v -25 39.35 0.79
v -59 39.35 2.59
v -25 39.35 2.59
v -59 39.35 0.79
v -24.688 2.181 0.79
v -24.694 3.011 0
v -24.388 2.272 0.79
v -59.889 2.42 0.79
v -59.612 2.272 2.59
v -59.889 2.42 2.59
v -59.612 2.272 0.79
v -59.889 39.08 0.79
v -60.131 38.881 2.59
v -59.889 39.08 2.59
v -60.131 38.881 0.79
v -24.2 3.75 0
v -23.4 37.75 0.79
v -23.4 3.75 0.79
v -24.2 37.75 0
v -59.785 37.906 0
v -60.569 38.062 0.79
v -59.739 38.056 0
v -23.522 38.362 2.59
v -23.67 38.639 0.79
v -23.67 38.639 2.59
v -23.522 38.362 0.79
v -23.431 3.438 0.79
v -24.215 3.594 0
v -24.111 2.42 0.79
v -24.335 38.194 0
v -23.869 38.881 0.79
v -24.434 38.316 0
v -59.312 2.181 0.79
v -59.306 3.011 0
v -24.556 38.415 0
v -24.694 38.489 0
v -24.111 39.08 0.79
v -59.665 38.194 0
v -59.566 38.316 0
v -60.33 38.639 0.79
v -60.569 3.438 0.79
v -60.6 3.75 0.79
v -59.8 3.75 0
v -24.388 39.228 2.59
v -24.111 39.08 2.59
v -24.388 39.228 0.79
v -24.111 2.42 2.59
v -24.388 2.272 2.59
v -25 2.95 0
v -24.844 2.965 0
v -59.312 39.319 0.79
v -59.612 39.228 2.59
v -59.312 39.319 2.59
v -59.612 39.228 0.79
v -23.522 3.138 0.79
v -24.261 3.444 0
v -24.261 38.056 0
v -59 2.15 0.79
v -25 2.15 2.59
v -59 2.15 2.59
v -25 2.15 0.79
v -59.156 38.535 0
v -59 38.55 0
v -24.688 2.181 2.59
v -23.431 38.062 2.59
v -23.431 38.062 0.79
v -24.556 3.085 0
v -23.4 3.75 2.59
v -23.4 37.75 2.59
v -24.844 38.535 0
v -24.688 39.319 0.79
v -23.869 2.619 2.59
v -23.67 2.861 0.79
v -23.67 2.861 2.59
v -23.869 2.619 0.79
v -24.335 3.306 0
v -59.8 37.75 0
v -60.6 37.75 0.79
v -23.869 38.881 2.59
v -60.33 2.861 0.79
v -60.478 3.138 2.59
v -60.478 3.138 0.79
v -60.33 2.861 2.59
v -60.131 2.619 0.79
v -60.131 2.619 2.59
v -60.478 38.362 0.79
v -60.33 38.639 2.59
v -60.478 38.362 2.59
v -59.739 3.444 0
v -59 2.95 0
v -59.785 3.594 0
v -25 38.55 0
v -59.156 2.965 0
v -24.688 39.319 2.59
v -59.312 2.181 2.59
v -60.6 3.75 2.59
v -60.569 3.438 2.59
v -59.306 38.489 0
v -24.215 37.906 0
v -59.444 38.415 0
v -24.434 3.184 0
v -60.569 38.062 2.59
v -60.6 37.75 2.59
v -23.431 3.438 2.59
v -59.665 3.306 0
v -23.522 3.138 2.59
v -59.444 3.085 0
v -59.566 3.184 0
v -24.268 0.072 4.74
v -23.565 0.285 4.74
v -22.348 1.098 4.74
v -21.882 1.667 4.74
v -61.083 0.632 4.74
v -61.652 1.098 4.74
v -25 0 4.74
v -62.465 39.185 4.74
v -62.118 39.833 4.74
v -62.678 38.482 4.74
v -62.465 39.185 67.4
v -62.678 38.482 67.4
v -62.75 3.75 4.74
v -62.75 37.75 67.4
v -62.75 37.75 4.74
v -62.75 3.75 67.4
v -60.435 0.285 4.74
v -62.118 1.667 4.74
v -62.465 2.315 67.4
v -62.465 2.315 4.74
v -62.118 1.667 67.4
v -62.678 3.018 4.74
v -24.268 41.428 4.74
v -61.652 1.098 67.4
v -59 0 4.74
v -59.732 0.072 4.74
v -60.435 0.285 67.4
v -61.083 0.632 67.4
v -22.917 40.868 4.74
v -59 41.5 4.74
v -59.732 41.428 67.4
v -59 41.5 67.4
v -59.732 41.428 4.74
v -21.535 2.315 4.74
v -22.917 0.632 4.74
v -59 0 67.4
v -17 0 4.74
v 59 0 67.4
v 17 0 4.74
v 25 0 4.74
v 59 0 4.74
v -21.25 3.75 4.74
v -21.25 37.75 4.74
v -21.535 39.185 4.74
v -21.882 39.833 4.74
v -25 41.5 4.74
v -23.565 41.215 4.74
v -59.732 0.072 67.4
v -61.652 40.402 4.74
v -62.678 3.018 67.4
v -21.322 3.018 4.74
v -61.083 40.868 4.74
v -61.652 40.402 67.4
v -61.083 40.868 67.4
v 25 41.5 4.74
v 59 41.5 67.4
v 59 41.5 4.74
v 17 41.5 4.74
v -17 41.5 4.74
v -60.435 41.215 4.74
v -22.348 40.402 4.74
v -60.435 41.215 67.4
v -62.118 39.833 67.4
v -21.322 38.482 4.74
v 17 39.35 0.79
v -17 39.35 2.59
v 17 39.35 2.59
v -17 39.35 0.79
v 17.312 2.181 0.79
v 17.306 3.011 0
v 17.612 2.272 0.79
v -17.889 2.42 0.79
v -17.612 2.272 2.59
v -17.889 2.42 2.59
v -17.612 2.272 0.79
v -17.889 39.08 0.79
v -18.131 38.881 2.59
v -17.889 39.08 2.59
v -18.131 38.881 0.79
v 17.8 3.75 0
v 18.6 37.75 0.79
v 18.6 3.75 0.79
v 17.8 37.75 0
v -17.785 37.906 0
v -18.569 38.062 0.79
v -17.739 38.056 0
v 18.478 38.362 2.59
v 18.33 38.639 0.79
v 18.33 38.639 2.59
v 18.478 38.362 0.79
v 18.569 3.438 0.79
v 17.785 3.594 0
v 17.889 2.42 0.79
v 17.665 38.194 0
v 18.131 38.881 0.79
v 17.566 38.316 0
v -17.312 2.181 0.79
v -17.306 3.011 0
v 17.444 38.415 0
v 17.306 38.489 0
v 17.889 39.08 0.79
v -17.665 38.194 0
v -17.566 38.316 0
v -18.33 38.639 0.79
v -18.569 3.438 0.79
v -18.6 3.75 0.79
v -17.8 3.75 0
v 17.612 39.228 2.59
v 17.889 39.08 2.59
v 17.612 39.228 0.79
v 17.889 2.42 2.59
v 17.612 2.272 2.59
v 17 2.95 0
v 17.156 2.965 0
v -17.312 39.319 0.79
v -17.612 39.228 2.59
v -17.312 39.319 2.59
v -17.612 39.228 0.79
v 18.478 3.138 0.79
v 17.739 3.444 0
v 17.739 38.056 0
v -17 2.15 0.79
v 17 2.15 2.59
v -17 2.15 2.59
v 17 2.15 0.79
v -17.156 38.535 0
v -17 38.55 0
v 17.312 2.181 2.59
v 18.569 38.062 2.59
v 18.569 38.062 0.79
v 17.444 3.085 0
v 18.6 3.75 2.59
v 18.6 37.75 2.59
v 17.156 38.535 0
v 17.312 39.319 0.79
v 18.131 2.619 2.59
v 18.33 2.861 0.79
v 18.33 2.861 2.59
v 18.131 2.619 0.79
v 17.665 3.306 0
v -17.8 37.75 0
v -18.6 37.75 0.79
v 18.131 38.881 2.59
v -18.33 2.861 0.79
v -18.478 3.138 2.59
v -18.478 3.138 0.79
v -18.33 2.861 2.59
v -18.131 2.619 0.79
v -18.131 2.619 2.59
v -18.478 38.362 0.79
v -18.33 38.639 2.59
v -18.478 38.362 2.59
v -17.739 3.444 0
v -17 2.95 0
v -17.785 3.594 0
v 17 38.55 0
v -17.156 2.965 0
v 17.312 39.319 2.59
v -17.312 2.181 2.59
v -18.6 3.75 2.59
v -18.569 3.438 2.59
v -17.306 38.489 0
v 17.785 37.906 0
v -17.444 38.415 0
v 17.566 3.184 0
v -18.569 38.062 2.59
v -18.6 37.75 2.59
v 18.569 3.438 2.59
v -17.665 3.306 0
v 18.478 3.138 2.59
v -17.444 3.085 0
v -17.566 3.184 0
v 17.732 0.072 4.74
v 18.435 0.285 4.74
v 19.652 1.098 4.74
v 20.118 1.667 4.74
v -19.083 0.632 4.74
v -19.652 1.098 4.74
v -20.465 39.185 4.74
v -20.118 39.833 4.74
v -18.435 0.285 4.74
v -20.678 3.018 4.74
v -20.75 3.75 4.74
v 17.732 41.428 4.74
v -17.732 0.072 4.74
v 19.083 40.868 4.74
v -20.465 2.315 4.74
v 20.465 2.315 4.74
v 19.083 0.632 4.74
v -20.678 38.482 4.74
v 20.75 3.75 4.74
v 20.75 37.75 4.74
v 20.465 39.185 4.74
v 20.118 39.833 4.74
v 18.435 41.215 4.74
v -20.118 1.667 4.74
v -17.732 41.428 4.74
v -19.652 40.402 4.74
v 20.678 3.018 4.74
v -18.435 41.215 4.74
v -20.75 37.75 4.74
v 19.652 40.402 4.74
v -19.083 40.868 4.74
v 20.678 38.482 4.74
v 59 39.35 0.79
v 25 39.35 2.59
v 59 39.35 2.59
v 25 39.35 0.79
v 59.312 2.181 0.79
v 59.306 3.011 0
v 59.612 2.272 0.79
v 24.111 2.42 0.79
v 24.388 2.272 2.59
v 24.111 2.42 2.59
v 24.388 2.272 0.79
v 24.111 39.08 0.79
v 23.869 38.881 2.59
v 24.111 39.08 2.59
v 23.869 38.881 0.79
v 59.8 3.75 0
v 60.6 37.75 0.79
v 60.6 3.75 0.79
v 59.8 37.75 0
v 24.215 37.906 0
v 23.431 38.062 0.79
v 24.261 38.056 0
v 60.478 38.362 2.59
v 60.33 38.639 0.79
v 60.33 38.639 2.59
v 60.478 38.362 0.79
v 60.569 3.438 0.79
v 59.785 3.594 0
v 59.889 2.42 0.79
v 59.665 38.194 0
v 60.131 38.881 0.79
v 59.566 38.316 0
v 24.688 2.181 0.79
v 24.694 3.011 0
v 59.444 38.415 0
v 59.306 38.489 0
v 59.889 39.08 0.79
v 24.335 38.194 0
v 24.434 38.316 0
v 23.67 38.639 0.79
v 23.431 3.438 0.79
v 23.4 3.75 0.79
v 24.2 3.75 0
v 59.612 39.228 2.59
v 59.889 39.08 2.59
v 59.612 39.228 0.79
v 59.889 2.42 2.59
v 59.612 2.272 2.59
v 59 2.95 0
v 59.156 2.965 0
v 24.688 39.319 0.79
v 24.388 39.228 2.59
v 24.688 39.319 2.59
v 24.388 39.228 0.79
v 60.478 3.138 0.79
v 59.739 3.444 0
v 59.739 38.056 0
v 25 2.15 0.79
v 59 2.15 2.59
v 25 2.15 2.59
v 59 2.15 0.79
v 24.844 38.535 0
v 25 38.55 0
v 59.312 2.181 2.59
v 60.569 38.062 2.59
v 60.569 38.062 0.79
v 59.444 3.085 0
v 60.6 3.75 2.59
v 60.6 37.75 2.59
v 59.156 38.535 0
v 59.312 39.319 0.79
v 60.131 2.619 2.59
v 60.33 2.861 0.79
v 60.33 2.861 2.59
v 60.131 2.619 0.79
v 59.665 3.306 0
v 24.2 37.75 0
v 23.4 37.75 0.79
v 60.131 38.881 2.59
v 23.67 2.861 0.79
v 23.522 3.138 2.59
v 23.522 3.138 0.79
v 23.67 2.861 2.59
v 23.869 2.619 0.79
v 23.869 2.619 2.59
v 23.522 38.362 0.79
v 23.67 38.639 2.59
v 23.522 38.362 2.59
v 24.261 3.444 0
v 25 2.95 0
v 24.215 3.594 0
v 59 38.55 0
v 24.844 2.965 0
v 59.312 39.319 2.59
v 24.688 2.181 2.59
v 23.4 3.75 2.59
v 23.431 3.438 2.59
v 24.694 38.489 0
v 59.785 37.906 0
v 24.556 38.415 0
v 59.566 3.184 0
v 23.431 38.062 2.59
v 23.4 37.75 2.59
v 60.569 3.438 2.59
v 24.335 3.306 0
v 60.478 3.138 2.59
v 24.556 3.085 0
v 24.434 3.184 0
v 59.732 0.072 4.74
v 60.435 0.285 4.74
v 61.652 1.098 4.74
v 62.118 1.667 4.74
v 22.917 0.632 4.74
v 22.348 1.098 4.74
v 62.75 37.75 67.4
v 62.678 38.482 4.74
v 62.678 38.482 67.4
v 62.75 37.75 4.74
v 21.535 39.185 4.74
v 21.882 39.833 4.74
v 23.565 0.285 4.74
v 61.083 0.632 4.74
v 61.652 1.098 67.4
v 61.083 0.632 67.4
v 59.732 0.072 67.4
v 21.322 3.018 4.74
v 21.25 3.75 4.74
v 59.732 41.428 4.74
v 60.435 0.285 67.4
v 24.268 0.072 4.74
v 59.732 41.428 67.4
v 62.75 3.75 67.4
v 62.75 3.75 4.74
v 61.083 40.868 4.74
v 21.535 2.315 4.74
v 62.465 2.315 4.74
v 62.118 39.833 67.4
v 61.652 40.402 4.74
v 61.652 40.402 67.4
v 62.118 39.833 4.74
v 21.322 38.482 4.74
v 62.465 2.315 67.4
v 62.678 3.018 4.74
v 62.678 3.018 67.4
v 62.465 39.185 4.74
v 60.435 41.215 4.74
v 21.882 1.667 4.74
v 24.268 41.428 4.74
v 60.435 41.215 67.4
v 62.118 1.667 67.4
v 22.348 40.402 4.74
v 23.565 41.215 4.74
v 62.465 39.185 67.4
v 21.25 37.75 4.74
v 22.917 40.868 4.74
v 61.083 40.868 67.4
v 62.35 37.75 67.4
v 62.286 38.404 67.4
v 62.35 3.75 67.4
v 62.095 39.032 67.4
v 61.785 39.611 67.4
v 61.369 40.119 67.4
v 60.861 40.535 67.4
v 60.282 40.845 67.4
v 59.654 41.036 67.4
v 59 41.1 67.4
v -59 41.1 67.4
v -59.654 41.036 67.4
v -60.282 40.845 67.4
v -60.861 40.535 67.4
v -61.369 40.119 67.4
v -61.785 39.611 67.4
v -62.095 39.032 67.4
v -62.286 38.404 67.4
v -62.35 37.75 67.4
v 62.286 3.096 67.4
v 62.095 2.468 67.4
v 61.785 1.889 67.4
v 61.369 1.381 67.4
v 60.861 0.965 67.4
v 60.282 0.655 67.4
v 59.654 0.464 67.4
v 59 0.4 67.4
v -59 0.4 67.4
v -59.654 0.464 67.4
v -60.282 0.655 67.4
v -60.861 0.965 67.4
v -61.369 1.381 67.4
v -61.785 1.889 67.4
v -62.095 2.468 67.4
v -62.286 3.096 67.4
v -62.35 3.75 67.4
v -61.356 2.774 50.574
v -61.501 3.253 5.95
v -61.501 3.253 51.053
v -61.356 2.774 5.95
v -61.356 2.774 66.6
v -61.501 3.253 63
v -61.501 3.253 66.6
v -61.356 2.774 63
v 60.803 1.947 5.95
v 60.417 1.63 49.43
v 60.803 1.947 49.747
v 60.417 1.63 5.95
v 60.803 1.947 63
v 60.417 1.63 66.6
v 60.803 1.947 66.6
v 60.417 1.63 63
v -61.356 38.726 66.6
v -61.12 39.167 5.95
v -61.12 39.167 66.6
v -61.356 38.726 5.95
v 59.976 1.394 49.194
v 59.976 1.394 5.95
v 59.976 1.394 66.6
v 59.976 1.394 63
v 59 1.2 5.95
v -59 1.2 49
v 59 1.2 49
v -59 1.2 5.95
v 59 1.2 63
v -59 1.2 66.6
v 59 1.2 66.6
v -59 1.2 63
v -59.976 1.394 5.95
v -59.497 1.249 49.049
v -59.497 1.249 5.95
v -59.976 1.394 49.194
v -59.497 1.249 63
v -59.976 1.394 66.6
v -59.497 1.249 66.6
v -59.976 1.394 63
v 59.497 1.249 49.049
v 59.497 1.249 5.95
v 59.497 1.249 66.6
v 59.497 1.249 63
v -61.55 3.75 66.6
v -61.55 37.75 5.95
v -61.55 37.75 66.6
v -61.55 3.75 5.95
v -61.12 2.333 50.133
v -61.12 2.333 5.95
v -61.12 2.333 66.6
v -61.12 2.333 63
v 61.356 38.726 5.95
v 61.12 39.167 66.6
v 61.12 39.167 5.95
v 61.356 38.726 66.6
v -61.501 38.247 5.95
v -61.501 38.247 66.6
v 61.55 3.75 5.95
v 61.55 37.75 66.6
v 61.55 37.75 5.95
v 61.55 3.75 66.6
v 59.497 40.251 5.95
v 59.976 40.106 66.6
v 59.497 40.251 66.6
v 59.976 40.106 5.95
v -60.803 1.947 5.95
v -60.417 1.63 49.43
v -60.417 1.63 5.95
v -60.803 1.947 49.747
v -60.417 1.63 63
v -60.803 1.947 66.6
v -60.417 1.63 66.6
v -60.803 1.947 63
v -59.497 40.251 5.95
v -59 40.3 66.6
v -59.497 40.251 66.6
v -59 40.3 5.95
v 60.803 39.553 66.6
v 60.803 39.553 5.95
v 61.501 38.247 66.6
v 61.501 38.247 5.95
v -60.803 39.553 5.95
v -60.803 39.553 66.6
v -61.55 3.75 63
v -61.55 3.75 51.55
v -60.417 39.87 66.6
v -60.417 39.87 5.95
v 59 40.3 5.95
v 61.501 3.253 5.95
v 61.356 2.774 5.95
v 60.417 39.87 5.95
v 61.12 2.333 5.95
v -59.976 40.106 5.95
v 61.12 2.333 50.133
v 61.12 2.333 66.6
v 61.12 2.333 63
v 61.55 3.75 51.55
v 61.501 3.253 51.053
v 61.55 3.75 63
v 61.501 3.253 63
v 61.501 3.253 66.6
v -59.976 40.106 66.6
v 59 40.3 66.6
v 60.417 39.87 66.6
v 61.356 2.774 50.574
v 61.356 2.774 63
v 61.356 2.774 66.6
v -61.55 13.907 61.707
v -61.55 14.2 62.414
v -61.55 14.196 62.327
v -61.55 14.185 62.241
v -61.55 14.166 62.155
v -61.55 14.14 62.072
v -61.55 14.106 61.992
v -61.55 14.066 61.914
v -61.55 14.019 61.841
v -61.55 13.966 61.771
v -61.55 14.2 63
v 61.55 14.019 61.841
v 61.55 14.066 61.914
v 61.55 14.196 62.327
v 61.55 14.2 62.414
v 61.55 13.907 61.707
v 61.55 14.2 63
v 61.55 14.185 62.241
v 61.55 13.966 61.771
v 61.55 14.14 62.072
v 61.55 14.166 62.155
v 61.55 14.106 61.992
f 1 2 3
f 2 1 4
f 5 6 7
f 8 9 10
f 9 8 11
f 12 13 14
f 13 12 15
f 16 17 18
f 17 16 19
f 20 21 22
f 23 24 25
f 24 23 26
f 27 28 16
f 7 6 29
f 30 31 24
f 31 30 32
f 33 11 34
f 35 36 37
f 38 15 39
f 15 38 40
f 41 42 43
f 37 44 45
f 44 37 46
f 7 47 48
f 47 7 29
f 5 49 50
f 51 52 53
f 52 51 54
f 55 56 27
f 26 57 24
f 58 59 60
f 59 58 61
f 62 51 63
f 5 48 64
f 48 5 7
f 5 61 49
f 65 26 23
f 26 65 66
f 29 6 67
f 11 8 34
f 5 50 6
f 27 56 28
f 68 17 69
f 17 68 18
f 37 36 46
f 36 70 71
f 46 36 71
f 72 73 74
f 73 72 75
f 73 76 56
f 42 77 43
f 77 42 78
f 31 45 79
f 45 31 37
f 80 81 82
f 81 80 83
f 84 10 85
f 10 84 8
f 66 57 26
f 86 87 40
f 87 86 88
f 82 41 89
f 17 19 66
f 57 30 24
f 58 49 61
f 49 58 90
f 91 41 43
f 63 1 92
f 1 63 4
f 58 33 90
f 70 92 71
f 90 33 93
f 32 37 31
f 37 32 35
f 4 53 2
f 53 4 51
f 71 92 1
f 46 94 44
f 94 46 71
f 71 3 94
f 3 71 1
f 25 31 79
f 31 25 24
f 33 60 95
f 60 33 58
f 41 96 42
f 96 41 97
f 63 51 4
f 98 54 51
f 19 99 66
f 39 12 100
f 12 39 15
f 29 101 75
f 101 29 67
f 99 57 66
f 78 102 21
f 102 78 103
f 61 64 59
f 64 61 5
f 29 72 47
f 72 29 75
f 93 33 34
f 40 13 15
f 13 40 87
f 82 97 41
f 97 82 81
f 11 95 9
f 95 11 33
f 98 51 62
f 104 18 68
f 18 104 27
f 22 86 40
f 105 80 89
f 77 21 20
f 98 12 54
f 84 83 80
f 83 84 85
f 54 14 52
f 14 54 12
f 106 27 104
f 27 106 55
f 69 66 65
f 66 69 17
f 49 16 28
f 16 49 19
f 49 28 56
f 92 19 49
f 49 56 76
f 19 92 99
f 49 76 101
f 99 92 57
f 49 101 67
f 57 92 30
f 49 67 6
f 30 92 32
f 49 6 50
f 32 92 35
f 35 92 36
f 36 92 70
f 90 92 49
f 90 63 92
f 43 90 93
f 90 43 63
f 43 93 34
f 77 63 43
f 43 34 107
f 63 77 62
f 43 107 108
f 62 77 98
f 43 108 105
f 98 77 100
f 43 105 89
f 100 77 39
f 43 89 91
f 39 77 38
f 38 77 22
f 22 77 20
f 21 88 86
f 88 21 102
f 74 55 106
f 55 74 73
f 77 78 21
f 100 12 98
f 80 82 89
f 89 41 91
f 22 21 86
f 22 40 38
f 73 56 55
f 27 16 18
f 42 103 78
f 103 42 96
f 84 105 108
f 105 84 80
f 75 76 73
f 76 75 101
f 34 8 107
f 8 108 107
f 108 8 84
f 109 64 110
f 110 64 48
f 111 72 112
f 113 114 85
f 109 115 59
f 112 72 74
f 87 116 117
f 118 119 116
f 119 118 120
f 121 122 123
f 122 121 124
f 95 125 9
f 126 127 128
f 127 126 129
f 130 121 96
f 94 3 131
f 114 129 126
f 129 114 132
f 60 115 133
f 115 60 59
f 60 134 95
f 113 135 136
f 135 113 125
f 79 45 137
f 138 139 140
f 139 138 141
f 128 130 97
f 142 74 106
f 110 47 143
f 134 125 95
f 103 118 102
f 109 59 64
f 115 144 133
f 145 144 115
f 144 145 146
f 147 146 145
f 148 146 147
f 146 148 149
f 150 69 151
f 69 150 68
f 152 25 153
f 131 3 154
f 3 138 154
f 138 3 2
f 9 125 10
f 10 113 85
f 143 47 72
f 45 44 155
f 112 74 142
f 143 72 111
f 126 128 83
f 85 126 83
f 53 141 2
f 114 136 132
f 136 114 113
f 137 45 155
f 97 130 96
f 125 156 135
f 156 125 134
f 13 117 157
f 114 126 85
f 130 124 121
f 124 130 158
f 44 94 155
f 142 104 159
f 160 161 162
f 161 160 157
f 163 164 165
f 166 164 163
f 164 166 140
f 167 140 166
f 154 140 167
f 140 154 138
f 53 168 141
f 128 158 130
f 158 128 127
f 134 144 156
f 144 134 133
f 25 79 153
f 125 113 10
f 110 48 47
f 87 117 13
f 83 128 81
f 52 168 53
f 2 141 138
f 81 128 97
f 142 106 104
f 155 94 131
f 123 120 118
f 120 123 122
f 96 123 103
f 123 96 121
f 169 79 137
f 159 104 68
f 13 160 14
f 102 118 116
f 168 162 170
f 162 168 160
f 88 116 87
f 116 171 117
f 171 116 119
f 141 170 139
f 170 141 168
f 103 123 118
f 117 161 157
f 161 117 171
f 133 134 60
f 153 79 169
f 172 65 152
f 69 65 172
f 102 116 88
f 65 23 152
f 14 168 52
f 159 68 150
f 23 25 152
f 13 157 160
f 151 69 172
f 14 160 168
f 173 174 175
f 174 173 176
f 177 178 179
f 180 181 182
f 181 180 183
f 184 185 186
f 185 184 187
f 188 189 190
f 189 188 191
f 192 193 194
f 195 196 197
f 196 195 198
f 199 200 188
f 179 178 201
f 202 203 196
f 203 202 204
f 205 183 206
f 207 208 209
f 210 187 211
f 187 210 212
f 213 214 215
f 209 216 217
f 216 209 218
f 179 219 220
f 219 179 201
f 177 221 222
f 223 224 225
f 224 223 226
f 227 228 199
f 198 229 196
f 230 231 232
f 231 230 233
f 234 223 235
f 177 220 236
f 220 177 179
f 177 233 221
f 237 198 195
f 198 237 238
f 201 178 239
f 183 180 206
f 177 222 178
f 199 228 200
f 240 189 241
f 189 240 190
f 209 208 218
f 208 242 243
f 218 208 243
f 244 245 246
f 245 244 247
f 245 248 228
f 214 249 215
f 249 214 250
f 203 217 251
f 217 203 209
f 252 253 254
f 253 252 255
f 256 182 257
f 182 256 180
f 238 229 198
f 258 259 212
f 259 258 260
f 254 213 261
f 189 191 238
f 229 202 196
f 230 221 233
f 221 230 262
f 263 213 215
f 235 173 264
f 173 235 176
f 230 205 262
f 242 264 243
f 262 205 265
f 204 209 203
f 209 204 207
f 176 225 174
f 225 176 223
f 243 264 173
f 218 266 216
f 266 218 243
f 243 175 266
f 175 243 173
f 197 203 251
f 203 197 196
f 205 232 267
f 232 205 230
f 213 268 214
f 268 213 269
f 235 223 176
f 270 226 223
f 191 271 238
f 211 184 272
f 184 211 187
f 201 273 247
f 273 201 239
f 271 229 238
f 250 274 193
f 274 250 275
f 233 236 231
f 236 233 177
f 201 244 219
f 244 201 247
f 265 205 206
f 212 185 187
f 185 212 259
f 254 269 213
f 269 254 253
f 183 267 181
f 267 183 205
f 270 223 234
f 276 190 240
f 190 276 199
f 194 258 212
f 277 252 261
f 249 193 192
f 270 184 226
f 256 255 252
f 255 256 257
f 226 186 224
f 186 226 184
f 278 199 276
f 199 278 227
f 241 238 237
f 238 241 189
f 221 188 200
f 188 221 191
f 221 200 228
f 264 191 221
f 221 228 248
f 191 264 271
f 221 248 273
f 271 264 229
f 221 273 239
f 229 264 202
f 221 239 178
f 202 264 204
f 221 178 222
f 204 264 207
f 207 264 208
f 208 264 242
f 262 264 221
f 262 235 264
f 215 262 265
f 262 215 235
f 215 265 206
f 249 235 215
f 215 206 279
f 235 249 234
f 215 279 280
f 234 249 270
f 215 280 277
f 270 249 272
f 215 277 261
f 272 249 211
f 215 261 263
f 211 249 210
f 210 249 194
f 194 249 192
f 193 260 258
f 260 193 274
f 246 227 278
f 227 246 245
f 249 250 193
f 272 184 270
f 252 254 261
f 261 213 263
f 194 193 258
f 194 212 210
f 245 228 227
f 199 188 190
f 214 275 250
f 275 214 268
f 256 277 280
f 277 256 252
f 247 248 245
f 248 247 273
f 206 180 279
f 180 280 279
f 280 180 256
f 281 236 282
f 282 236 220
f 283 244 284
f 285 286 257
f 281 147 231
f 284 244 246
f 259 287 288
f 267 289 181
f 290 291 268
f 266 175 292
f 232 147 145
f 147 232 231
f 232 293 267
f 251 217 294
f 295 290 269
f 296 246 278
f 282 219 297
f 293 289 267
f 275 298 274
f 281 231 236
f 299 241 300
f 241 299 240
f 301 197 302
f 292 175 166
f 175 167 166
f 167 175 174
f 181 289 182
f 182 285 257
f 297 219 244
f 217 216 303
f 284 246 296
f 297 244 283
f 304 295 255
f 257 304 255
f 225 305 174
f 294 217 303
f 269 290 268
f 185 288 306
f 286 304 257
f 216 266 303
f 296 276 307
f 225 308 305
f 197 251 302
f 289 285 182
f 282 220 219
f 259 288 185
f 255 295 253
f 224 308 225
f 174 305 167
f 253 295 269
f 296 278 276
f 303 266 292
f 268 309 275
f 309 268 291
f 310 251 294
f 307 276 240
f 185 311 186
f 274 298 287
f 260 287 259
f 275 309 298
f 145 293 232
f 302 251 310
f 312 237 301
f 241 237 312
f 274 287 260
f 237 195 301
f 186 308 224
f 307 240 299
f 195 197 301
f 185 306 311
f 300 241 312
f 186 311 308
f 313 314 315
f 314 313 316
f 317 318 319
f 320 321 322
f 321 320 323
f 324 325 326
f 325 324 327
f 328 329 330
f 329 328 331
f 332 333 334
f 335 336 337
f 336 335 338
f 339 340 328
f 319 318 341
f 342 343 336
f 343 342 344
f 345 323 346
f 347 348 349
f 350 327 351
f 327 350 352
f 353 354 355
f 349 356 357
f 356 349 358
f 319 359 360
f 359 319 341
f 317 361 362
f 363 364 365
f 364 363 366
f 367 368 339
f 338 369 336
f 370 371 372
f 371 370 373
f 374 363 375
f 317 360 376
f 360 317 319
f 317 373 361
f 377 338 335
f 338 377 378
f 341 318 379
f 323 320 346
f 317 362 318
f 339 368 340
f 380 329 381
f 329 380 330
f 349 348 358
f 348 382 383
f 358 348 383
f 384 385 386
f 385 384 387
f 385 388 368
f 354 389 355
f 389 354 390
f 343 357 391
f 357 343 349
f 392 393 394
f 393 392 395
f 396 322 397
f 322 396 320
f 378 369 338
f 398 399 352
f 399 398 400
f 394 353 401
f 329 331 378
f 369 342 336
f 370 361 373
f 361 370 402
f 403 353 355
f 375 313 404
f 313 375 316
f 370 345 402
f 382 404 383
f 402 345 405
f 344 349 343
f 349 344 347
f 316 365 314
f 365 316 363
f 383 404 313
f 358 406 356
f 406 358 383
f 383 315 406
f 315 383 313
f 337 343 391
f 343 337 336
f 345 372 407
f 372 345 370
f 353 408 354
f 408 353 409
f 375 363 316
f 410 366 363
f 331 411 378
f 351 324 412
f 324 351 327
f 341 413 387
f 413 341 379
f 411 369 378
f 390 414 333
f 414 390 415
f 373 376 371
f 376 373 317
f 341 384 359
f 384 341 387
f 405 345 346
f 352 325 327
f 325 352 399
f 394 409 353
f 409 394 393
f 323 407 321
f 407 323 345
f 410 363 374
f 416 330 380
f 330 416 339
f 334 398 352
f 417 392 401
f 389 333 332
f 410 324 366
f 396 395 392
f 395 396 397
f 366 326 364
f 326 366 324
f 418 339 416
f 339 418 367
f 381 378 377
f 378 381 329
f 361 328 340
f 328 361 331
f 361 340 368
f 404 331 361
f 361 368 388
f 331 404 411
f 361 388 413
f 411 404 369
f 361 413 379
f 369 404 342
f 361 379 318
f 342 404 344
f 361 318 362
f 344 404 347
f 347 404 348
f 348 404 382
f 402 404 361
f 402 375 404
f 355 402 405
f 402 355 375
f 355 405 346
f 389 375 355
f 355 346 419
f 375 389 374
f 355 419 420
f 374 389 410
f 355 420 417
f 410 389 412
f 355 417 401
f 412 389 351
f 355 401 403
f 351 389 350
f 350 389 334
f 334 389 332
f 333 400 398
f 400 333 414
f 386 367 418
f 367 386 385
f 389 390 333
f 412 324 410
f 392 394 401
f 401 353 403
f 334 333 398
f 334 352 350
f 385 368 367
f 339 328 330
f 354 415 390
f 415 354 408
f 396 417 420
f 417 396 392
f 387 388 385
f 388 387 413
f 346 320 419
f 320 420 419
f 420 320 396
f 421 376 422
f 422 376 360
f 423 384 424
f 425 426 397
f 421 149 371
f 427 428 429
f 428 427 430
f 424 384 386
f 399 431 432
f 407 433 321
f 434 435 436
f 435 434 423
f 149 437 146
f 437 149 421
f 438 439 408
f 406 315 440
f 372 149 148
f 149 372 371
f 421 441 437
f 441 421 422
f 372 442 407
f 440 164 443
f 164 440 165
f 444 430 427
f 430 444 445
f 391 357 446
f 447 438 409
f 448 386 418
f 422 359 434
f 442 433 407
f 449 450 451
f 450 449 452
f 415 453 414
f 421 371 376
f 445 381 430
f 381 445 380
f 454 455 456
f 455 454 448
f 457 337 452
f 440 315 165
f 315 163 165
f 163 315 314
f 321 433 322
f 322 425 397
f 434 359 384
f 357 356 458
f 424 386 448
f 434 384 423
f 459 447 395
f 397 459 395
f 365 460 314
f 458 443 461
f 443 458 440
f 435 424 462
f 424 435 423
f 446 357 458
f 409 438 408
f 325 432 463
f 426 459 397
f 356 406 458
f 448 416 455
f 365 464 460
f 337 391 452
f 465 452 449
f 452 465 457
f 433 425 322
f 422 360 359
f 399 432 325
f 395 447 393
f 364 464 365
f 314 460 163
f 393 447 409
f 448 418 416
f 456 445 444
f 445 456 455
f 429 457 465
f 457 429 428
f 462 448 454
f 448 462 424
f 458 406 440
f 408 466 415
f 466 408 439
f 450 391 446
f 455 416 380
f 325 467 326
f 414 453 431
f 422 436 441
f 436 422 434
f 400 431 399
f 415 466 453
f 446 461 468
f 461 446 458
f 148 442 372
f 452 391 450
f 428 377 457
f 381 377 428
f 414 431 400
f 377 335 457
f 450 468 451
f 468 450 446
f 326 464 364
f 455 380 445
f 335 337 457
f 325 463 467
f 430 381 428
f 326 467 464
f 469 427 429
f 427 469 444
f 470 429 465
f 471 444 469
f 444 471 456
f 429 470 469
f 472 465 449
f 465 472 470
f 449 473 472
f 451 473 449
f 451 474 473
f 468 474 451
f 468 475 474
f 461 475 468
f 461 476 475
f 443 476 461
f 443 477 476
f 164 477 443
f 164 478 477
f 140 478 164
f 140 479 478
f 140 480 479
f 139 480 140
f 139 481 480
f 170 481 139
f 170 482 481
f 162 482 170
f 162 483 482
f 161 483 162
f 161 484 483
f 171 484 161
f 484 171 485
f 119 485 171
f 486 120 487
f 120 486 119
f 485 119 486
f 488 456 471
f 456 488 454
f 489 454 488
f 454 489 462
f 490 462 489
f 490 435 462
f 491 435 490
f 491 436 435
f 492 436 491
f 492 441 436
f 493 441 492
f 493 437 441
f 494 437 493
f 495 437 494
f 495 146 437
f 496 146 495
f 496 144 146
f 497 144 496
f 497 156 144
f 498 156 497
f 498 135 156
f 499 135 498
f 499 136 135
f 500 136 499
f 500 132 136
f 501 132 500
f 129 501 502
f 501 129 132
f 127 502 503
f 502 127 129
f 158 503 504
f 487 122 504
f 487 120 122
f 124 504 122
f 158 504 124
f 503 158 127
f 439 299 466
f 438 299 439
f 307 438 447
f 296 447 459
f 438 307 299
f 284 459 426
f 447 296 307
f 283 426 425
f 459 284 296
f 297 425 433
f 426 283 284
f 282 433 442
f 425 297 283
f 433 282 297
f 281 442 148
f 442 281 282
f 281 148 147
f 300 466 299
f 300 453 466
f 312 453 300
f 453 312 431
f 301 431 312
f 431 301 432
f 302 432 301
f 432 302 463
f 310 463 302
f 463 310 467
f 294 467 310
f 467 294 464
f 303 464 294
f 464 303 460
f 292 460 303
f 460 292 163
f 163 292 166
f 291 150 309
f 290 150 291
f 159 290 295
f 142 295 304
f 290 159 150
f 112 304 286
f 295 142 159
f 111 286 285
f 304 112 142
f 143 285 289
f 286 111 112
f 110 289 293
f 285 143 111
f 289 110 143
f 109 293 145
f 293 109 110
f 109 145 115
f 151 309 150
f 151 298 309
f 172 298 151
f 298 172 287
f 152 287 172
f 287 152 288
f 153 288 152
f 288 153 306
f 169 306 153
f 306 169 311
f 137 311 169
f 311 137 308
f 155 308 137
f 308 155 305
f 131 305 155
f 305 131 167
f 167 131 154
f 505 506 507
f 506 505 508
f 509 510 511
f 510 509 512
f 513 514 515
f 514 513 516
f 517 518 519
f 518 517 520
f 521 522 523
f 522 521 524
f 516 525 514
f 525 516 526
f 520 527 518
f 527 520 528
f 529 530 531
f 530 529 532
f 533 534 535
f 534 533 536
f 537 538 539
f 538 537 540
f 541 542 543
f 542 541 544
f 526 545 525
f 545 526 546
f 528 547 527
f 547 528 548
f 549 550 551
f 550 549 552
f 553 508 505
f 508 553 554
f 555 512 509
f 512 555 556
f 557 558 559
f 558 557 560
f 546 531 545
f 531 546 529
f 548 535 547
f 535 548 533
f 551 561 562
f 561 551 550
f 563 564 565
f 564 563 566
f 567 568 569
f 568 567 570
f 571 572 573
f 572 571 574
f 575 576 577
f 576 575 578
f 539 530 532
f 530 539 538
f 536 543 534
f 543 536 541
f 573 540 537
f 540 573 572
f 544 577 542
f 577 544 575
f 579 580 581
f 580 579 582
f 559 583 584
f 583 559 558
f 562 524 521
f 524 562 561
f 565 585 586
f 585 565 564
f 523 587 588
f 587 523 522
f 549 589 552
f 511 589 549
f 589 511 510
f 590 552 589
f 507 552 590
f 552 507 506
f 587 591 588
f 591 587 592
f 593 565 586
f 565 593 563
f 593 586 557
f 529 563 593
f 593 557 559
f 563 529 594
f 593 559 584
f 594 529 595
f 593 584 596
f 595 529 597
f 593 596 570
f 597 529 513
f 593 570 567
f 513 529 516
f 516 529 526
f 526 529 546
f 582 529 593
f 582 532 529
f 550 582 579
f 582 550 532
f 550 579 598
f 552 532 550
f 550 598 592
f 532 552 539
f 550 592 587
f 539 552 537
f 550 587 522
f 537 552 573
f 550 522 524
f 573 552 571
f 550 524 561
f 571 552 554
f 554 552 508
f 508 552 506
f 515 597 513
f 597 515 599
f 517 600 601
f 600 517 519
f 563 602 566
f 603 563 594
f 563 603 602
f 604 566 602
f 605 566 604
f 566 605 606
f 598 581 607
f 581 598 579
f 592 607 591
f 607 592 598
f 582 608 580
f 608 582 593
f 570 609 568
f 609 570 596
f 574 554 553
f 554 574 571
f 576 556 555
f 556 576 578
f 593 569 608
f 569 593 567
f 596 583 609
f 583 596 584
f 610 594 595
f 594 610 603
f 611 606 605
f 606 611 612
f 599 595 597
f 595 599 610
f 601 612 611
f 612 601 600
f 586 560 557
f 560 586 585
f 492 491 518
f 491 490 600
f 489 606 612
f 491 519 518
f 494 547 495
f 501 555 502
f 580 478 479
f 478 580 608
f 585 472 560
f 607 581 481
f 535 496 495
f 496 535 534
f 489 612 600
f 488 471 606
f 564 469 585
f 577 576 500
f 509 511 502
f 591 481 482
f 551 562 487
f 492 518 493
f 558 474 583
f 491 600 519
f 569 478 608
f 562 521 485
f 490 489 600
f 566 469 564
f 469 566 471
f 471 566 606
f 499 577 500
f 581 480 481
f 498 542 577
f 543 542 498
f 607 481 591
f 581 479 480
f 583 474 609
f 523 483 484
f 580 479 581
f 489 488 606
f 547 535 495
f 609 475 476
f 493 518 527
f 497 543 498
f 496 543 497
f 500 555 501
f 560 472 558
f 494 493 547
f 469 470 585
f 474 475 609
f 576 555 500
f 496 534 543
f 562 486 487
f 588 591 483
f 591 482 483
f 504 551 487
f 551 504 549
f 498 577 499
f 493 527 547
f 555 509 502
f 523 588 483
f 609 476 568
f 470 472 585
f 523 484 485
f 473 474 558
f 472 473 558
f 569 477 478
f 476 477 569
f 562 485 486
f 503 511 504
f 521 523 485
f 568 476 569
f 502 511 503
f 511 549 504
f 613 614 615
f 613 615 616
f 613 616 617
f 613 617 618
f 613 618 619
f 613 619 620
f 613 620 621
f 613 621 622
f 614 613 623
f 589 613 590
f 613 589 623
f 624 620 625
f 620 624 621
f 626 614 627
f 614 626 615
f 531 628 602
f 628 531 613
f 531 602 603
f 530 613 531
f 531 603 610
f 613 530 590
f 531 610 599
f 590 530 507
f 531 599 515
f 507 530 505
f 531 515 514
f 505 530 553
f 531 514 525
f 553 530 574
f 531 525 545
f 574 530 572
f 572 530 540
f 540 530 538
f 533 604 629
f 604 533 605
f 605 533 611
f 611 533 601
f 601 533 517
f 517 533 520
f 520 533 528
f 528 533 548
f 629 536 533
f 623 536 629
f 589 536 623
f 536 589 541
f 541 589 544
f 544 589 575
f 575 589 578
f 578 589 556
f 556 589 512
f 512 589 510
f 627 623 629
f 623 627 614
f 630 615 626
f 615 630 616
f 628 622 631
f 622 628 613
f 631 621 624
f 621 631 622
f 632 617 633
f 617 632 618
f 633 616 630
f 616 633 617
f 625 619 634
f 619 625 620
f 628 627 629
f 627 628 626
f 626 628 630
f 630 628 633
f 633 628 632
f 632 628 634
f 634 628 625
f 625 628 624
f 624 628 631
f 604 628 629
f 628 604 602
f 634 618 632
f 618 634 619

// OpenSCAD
// file: ../../../modules/gridfinity.scad
// Gridfinity ベースプレートの共有 module。
// 寸法は Gridfinity 仕様 (Zack Freedman) の baseplate 輪郭に従う:
//   ピッチ 42、ソケット上端開口 41.5 (角 R4)、上から 45° 面取り 2.15 →
//   垂直 1.8 (37.2 角・R1.85) → 45° 面取り 0.7 → 底 35.8 角 (R1.15)。
//   ソケット深さ = 2.15 + 1.8 + 0.7 = 4.65。
//
// 座標系: X が列方向 (中央が 0)、Y が行方向 (板の前端が 0)、Z=0 が板の底面。
// 板の外形は grid とは独立に rim で与えるので、grid より大きい板 (縁付き) を
// 作れる。ソケットは rim=[left, right, front, back] の内側へ 42 ピッチで並ぶ。

gf_pitch = 42;
gf_socket_top = 41.5; // 上端開口
gf_socket_mid = 37.2; // 垂直部
gf_socket_bot = 35.8; // 底
gf_socket_r_top = 4;
gf_socket_r_mid = 1.85;
gf_socket_r_bot = 1.15;
gf_chamfer_top = 2.15;
gf_wall_h = 1.8;
gf_chamfer_bot = 0.7;
gf_socket_depth = gf_chamfer_top + gf_wall_h + gf_chamfer_bot; // 4.65
gf_fn = 32;
gf_eps = 0.01; // hull 用の薄板の厚さ
gf_over = 0.5; // 切削の抜き代

// 角丸正方形または矩形 (w は一辺、または [幅, 奥行き]、角 R)
module
gf_rounded_square(w, r)
{
    offset(r = r, $fn = gf_fn)
        square(is_list(w) ? w - [ 2 * r, 2 * r ] : w - 2 * r, center = true);
}

// 厚さ gf_eps の角丸正方形の薄板を z に置く (hull の骨)
module
gf_slab(w, r, z)
{
    translate([ 0, 0, z ]) linear_extrude(gf_eps) gf_rounded_square(w, r);
}

// ソケット1個の切削体。z=0 がソケットの底 (床の天面)、+Z へ 4.65 で天面に出る。
// clearance は嵌合の逃げで、輪郭を全周へ clearance だけ外へ出す (幅 +2c、角 R
// +c)。pitch_x は X 方向のセル幅。端数でも角 R と面取りの寸法を保つ。
module
gf_socket_cut(clearance = 0, pitch_x = gf_pitch)
{
    z1 = gf_chamfer_bot;
    z2 = z1 + gf_wall_h;
    z3 = gf_socket_depth;
    c = clearance;
    assert(pitch_x > gf_pitch - gf_socket_top + 2 * gf_socket_r_top,
           "Cell width is too small for the socket corner radius");
    delta = [ pitch_x - gf_pitch, 0 ];
    bot = [ gf_socket_bot + 2 * c, gf_socket_bot + 2 * c ] + delta;
    mid = [ gf_socket_mid + 2 * c, gf_socket_mid + 2 * c ] + delta;
    top = [ gf_socket_top + 2 * c, gf_socket_top + 2 * c ] + delta;
    hull()
    {
        gf_slab(bot, gf_socket_r_bot + c, 0);
        gf_slab(mid, gf_socket_r_mid + c, z1 - gf_eps);
    }
    hull()
    {
        gf_slab(mid, gf_socket_r_mid + c, z1 - gf_eps);
        gf_slab(mid, gf_socket_r_mid + c, z2 - gf_eps);
    }
    hull()
    {
        gf_slab(mid, gf_socket_r_mid + c, z2 - gf_eps);
        gf_slab(top, gf_socket_r_top + c, z3 - gf_eps);
    }
    // 天面より上へ抜く (天面と同一平面の退化した面を残さない)
    gf_slab(top, gf_socket_r_top + c, z3 - gf_eps);
    translate([ 0, 0, z3 - gf_eps ]) linear_extrude(gf_over + gf_eps)
        gf_rounded_square(top, gf_socket_r_top + c);
}

// ベースプレート。cols x rows のソケットを床 floor_t の上に彫る。
// rim = [left, right, front, back] はソケット列の外側に残す縁の幅。
// 板の幅 = cols*42 + left + right、奥行き = rows*42 + front + back。
// cols の端数は左端の細幅セルになる。rows は正の整数。
// clearance はソケットの嵌合の逃げ (gf_socket_cut を参照)。
module
gf_baseplate(cols, rows, rim = [ 0, 0, 0, 0 ], floor_t = 1, clearance = 0)
{
    grid_w = cols * gf_pitch;
    grid_d = rows * gf_pitch;
    plate_w = grid_w + rim[0] + rim[1];
    plate_d = grid_d + rim[2] + rim[3];
    x0 = -plate_w / 2 + rim[0]; // ソケット列の左端
    first_pitch = grid_w - (ceil(cols) - 1) * gf_pitch;
    difference()
    {
        translate([ -plate_w / 2, 0, 0 ])
            cube([ plate_w, plate_d, floor_t + gf_socket_depth ]);
        for (c = [0:ceil(cols) - 1], r = [0:rows - 1])
            translate([
                x0 + (c == 0 ? first_pitch / 2
                             : first_pitch + (c - 0.5) * gf_pitch),
                rim[2] + (r + 0.5) * gf_pitch,
                floor_t
            ]) gf_socket_cut(clearance, c == 0 ? first_pitch : gf_pitch);
    }
}
// file: ../../../modules/gridfinity_bins.scad
include <gridfinity_bin.scad>

// assets/gridfinity-bin/ の bin 群の共通値と、サイズ 3 引数の払い出し口。
// 単体では何も描かない。設計の経緯と確定値は
// ledger/designs/gridfinity-bin-4u.md が正本。
// 通常binは4U/9U、X={1,1.5,2,2.5,3} × Y={1,2,3,4,5,5.5}。
// 両軸に端数を持つ組み合わせはassetに置かない（各高さ28種）。
// Xが横、Yがラベルの壁から奥、unitsが高さ（7mm単位）。
wall = 1.2;    // 0.4 ノズル 3 本
floor_t = 1.2; // 底 (4.75) の上に載せる床。床の天面 z = 5.95
label_d = 13;  // 12mm 幅のラベルシールを貼る天板の張り出し
label_t = 1; // 天板の厚さ (user 指定)。下は 45° の無垢のくさび
label_r = 1; // 天板の先端と 45° 面の境目の R (user 指定)
// カードケース (goods/card_case_2x3x4u.scad) の値。カードは ISO/IEC 7810 ID-1 (85.6 × 54 ×
// 0.76、隅 R3) で、長辺を Y (rows 方向) に寝かせ、X 中央・手前の壁から 10 奥に置く。ポケットは
// カードより 1 大きい (片側 0.5)。右奥のマスは壁の内面まで抜き、床と底を外形に平行な 45° の窪みにする。
// ポケットの左右の埋めの天面 (幅 13.05) が 12mm のラベルを貼る帯。ポケットと穴の交点の
// 縦エッジは丸める (開口の上縁は丸めない: 壁を上端まで垂直に保ち、収まる枚数を減らさない)
card_w = 54;    // カードの短辺 (X)。user 指定「高さ 54」
card_d = 85.6;  // カードの長辺 (Y)。user 指定「幅 85.6」
card_clear = 1; // ポケットの余裕 (user 指定「+1mm」)
// ポケットの手前の辺の、手前の壁の内面からの距離 (user 指定「10mm」)
card_off = 10;
// ポケットの平面の隅 R (user 指定「角の丸み 3mm」。ID-1 の隅は 2.88..3.48)
card_r = 3;
// ポケットと穴が交わる所の、埋めの凸の縦エッジの R (指の当たる角)
card_edge_r = 2;
recess_skin = floor_t + 1.75; // 窪みの床 z (底の皮)。user 指定「壁厚と同じ 1.2 は過剰、1.75 返す」

function bin_contract(cols, rows, units) = str("CONTRACT units=",
                                               units,
                                               " pitch=",
                                               gf_pitch,
                                               " outer=",
                                               gfb_outer,
                                               " h=",
                                               units* gfb_unit,
                                               " lip=",
                                               gfb_lip_h,
                                               " base=",
                                               gfb_base_bot,
                                               "/",
                                               gfb_base_mid,
                                               "/",
                                               gfb_outer,
                                               " base_h=",
                                               gfb_base_h,
                                               " wall=",
                                               wall,
                                               " floor_top=",
                                               gfb_base_h + floor_t,
                                               " label=",
                                               label_d,
                                               "x",
                                               label_t,
                                               " wedge=45 fillet=",
                                               label_r,
                                               " bin=",
                                               cols,
                                               "x",
                                               rows,
                                               " size=",
                                               cols* gf_pitch - 0.5,
                                               "x",
                                               rows* gf_pitch - 0.5);

// (cols, rows, units) でラベル付き bin を払い出す。例: gridfinity_bin(2, 4, 4)
module
gridfinity_bin(cols, rows, units = 4)
{
    echo(bin_contract(cols, rows, units));
    gfb_bin(cols, rows, units, wall, floor_t, label_d, label_t, label_r);
}

function card_contract(cols, rows, units) = str("CONTRACT card units=",
                                                units,
                                                " bin=",
                                                cols,
                                                "x",
                                                rows,
                                                " size=",
                                                cols* gf_pitch - 0.5,
                                                "x",
                                                rows* gf_pitch - 0.5,
                                                " h=",
                                                units* gfb_unit,
                                                " lip=",
                                                gfb_lip_h,
                                                " floor_top=",
                                                gfb_base_h + floor_t,
                                                " card=",
                                                card_w,
                                                "x",
                                                card_d,
                                                " pocket=",
                                                card_w + card_clear,
                                                "x",
                                                card_d + card_clear,
                                                " at=",
                                                -(card_w + card_clear) / 2,
                                                ",",
                                                wall + card_off,
                                                " hole=",
                                                (cols - 1) / 2 * gf_pitch - gfb_outer / 2,
                                                ",",
                                                (rows - 0.5) * gf_pitch - 0.25 - gfb_outer / 2,
                                                " hole_r=",
                                                gfb_outer_r - wall,
                                                " recess=",
                                                gfb_outer - 2 * wall,
                                                "/",
                                                gfb_base_mid - 2 * wall,
                                                " recess_floor=",
                                                recess_skin,
                                                " r=",
                                                card_r,
                                                " edge_r=",
                                                card_edge_r);

// (cols, rows, units) でカードケースを払い出す。例: gridfinity_card_case(2, 3, 4)
module
gridfinity_card_case(cols, rows, units = 4)
{
    echo(card_contract(cols, rows, units));
    gfb_card_case(cols,
                  rows,
                  units,
                  wall,
                  floor_t,
                  [ card_w, card_d ],
                  card_clear,
                  card_off,
                  card_r,
                  recess_skin,
                  card_edge_r);
}
// main file
include <../../../modules/gridfinity_bins.scad>

gridfinity_bin(3, 1, 9);
